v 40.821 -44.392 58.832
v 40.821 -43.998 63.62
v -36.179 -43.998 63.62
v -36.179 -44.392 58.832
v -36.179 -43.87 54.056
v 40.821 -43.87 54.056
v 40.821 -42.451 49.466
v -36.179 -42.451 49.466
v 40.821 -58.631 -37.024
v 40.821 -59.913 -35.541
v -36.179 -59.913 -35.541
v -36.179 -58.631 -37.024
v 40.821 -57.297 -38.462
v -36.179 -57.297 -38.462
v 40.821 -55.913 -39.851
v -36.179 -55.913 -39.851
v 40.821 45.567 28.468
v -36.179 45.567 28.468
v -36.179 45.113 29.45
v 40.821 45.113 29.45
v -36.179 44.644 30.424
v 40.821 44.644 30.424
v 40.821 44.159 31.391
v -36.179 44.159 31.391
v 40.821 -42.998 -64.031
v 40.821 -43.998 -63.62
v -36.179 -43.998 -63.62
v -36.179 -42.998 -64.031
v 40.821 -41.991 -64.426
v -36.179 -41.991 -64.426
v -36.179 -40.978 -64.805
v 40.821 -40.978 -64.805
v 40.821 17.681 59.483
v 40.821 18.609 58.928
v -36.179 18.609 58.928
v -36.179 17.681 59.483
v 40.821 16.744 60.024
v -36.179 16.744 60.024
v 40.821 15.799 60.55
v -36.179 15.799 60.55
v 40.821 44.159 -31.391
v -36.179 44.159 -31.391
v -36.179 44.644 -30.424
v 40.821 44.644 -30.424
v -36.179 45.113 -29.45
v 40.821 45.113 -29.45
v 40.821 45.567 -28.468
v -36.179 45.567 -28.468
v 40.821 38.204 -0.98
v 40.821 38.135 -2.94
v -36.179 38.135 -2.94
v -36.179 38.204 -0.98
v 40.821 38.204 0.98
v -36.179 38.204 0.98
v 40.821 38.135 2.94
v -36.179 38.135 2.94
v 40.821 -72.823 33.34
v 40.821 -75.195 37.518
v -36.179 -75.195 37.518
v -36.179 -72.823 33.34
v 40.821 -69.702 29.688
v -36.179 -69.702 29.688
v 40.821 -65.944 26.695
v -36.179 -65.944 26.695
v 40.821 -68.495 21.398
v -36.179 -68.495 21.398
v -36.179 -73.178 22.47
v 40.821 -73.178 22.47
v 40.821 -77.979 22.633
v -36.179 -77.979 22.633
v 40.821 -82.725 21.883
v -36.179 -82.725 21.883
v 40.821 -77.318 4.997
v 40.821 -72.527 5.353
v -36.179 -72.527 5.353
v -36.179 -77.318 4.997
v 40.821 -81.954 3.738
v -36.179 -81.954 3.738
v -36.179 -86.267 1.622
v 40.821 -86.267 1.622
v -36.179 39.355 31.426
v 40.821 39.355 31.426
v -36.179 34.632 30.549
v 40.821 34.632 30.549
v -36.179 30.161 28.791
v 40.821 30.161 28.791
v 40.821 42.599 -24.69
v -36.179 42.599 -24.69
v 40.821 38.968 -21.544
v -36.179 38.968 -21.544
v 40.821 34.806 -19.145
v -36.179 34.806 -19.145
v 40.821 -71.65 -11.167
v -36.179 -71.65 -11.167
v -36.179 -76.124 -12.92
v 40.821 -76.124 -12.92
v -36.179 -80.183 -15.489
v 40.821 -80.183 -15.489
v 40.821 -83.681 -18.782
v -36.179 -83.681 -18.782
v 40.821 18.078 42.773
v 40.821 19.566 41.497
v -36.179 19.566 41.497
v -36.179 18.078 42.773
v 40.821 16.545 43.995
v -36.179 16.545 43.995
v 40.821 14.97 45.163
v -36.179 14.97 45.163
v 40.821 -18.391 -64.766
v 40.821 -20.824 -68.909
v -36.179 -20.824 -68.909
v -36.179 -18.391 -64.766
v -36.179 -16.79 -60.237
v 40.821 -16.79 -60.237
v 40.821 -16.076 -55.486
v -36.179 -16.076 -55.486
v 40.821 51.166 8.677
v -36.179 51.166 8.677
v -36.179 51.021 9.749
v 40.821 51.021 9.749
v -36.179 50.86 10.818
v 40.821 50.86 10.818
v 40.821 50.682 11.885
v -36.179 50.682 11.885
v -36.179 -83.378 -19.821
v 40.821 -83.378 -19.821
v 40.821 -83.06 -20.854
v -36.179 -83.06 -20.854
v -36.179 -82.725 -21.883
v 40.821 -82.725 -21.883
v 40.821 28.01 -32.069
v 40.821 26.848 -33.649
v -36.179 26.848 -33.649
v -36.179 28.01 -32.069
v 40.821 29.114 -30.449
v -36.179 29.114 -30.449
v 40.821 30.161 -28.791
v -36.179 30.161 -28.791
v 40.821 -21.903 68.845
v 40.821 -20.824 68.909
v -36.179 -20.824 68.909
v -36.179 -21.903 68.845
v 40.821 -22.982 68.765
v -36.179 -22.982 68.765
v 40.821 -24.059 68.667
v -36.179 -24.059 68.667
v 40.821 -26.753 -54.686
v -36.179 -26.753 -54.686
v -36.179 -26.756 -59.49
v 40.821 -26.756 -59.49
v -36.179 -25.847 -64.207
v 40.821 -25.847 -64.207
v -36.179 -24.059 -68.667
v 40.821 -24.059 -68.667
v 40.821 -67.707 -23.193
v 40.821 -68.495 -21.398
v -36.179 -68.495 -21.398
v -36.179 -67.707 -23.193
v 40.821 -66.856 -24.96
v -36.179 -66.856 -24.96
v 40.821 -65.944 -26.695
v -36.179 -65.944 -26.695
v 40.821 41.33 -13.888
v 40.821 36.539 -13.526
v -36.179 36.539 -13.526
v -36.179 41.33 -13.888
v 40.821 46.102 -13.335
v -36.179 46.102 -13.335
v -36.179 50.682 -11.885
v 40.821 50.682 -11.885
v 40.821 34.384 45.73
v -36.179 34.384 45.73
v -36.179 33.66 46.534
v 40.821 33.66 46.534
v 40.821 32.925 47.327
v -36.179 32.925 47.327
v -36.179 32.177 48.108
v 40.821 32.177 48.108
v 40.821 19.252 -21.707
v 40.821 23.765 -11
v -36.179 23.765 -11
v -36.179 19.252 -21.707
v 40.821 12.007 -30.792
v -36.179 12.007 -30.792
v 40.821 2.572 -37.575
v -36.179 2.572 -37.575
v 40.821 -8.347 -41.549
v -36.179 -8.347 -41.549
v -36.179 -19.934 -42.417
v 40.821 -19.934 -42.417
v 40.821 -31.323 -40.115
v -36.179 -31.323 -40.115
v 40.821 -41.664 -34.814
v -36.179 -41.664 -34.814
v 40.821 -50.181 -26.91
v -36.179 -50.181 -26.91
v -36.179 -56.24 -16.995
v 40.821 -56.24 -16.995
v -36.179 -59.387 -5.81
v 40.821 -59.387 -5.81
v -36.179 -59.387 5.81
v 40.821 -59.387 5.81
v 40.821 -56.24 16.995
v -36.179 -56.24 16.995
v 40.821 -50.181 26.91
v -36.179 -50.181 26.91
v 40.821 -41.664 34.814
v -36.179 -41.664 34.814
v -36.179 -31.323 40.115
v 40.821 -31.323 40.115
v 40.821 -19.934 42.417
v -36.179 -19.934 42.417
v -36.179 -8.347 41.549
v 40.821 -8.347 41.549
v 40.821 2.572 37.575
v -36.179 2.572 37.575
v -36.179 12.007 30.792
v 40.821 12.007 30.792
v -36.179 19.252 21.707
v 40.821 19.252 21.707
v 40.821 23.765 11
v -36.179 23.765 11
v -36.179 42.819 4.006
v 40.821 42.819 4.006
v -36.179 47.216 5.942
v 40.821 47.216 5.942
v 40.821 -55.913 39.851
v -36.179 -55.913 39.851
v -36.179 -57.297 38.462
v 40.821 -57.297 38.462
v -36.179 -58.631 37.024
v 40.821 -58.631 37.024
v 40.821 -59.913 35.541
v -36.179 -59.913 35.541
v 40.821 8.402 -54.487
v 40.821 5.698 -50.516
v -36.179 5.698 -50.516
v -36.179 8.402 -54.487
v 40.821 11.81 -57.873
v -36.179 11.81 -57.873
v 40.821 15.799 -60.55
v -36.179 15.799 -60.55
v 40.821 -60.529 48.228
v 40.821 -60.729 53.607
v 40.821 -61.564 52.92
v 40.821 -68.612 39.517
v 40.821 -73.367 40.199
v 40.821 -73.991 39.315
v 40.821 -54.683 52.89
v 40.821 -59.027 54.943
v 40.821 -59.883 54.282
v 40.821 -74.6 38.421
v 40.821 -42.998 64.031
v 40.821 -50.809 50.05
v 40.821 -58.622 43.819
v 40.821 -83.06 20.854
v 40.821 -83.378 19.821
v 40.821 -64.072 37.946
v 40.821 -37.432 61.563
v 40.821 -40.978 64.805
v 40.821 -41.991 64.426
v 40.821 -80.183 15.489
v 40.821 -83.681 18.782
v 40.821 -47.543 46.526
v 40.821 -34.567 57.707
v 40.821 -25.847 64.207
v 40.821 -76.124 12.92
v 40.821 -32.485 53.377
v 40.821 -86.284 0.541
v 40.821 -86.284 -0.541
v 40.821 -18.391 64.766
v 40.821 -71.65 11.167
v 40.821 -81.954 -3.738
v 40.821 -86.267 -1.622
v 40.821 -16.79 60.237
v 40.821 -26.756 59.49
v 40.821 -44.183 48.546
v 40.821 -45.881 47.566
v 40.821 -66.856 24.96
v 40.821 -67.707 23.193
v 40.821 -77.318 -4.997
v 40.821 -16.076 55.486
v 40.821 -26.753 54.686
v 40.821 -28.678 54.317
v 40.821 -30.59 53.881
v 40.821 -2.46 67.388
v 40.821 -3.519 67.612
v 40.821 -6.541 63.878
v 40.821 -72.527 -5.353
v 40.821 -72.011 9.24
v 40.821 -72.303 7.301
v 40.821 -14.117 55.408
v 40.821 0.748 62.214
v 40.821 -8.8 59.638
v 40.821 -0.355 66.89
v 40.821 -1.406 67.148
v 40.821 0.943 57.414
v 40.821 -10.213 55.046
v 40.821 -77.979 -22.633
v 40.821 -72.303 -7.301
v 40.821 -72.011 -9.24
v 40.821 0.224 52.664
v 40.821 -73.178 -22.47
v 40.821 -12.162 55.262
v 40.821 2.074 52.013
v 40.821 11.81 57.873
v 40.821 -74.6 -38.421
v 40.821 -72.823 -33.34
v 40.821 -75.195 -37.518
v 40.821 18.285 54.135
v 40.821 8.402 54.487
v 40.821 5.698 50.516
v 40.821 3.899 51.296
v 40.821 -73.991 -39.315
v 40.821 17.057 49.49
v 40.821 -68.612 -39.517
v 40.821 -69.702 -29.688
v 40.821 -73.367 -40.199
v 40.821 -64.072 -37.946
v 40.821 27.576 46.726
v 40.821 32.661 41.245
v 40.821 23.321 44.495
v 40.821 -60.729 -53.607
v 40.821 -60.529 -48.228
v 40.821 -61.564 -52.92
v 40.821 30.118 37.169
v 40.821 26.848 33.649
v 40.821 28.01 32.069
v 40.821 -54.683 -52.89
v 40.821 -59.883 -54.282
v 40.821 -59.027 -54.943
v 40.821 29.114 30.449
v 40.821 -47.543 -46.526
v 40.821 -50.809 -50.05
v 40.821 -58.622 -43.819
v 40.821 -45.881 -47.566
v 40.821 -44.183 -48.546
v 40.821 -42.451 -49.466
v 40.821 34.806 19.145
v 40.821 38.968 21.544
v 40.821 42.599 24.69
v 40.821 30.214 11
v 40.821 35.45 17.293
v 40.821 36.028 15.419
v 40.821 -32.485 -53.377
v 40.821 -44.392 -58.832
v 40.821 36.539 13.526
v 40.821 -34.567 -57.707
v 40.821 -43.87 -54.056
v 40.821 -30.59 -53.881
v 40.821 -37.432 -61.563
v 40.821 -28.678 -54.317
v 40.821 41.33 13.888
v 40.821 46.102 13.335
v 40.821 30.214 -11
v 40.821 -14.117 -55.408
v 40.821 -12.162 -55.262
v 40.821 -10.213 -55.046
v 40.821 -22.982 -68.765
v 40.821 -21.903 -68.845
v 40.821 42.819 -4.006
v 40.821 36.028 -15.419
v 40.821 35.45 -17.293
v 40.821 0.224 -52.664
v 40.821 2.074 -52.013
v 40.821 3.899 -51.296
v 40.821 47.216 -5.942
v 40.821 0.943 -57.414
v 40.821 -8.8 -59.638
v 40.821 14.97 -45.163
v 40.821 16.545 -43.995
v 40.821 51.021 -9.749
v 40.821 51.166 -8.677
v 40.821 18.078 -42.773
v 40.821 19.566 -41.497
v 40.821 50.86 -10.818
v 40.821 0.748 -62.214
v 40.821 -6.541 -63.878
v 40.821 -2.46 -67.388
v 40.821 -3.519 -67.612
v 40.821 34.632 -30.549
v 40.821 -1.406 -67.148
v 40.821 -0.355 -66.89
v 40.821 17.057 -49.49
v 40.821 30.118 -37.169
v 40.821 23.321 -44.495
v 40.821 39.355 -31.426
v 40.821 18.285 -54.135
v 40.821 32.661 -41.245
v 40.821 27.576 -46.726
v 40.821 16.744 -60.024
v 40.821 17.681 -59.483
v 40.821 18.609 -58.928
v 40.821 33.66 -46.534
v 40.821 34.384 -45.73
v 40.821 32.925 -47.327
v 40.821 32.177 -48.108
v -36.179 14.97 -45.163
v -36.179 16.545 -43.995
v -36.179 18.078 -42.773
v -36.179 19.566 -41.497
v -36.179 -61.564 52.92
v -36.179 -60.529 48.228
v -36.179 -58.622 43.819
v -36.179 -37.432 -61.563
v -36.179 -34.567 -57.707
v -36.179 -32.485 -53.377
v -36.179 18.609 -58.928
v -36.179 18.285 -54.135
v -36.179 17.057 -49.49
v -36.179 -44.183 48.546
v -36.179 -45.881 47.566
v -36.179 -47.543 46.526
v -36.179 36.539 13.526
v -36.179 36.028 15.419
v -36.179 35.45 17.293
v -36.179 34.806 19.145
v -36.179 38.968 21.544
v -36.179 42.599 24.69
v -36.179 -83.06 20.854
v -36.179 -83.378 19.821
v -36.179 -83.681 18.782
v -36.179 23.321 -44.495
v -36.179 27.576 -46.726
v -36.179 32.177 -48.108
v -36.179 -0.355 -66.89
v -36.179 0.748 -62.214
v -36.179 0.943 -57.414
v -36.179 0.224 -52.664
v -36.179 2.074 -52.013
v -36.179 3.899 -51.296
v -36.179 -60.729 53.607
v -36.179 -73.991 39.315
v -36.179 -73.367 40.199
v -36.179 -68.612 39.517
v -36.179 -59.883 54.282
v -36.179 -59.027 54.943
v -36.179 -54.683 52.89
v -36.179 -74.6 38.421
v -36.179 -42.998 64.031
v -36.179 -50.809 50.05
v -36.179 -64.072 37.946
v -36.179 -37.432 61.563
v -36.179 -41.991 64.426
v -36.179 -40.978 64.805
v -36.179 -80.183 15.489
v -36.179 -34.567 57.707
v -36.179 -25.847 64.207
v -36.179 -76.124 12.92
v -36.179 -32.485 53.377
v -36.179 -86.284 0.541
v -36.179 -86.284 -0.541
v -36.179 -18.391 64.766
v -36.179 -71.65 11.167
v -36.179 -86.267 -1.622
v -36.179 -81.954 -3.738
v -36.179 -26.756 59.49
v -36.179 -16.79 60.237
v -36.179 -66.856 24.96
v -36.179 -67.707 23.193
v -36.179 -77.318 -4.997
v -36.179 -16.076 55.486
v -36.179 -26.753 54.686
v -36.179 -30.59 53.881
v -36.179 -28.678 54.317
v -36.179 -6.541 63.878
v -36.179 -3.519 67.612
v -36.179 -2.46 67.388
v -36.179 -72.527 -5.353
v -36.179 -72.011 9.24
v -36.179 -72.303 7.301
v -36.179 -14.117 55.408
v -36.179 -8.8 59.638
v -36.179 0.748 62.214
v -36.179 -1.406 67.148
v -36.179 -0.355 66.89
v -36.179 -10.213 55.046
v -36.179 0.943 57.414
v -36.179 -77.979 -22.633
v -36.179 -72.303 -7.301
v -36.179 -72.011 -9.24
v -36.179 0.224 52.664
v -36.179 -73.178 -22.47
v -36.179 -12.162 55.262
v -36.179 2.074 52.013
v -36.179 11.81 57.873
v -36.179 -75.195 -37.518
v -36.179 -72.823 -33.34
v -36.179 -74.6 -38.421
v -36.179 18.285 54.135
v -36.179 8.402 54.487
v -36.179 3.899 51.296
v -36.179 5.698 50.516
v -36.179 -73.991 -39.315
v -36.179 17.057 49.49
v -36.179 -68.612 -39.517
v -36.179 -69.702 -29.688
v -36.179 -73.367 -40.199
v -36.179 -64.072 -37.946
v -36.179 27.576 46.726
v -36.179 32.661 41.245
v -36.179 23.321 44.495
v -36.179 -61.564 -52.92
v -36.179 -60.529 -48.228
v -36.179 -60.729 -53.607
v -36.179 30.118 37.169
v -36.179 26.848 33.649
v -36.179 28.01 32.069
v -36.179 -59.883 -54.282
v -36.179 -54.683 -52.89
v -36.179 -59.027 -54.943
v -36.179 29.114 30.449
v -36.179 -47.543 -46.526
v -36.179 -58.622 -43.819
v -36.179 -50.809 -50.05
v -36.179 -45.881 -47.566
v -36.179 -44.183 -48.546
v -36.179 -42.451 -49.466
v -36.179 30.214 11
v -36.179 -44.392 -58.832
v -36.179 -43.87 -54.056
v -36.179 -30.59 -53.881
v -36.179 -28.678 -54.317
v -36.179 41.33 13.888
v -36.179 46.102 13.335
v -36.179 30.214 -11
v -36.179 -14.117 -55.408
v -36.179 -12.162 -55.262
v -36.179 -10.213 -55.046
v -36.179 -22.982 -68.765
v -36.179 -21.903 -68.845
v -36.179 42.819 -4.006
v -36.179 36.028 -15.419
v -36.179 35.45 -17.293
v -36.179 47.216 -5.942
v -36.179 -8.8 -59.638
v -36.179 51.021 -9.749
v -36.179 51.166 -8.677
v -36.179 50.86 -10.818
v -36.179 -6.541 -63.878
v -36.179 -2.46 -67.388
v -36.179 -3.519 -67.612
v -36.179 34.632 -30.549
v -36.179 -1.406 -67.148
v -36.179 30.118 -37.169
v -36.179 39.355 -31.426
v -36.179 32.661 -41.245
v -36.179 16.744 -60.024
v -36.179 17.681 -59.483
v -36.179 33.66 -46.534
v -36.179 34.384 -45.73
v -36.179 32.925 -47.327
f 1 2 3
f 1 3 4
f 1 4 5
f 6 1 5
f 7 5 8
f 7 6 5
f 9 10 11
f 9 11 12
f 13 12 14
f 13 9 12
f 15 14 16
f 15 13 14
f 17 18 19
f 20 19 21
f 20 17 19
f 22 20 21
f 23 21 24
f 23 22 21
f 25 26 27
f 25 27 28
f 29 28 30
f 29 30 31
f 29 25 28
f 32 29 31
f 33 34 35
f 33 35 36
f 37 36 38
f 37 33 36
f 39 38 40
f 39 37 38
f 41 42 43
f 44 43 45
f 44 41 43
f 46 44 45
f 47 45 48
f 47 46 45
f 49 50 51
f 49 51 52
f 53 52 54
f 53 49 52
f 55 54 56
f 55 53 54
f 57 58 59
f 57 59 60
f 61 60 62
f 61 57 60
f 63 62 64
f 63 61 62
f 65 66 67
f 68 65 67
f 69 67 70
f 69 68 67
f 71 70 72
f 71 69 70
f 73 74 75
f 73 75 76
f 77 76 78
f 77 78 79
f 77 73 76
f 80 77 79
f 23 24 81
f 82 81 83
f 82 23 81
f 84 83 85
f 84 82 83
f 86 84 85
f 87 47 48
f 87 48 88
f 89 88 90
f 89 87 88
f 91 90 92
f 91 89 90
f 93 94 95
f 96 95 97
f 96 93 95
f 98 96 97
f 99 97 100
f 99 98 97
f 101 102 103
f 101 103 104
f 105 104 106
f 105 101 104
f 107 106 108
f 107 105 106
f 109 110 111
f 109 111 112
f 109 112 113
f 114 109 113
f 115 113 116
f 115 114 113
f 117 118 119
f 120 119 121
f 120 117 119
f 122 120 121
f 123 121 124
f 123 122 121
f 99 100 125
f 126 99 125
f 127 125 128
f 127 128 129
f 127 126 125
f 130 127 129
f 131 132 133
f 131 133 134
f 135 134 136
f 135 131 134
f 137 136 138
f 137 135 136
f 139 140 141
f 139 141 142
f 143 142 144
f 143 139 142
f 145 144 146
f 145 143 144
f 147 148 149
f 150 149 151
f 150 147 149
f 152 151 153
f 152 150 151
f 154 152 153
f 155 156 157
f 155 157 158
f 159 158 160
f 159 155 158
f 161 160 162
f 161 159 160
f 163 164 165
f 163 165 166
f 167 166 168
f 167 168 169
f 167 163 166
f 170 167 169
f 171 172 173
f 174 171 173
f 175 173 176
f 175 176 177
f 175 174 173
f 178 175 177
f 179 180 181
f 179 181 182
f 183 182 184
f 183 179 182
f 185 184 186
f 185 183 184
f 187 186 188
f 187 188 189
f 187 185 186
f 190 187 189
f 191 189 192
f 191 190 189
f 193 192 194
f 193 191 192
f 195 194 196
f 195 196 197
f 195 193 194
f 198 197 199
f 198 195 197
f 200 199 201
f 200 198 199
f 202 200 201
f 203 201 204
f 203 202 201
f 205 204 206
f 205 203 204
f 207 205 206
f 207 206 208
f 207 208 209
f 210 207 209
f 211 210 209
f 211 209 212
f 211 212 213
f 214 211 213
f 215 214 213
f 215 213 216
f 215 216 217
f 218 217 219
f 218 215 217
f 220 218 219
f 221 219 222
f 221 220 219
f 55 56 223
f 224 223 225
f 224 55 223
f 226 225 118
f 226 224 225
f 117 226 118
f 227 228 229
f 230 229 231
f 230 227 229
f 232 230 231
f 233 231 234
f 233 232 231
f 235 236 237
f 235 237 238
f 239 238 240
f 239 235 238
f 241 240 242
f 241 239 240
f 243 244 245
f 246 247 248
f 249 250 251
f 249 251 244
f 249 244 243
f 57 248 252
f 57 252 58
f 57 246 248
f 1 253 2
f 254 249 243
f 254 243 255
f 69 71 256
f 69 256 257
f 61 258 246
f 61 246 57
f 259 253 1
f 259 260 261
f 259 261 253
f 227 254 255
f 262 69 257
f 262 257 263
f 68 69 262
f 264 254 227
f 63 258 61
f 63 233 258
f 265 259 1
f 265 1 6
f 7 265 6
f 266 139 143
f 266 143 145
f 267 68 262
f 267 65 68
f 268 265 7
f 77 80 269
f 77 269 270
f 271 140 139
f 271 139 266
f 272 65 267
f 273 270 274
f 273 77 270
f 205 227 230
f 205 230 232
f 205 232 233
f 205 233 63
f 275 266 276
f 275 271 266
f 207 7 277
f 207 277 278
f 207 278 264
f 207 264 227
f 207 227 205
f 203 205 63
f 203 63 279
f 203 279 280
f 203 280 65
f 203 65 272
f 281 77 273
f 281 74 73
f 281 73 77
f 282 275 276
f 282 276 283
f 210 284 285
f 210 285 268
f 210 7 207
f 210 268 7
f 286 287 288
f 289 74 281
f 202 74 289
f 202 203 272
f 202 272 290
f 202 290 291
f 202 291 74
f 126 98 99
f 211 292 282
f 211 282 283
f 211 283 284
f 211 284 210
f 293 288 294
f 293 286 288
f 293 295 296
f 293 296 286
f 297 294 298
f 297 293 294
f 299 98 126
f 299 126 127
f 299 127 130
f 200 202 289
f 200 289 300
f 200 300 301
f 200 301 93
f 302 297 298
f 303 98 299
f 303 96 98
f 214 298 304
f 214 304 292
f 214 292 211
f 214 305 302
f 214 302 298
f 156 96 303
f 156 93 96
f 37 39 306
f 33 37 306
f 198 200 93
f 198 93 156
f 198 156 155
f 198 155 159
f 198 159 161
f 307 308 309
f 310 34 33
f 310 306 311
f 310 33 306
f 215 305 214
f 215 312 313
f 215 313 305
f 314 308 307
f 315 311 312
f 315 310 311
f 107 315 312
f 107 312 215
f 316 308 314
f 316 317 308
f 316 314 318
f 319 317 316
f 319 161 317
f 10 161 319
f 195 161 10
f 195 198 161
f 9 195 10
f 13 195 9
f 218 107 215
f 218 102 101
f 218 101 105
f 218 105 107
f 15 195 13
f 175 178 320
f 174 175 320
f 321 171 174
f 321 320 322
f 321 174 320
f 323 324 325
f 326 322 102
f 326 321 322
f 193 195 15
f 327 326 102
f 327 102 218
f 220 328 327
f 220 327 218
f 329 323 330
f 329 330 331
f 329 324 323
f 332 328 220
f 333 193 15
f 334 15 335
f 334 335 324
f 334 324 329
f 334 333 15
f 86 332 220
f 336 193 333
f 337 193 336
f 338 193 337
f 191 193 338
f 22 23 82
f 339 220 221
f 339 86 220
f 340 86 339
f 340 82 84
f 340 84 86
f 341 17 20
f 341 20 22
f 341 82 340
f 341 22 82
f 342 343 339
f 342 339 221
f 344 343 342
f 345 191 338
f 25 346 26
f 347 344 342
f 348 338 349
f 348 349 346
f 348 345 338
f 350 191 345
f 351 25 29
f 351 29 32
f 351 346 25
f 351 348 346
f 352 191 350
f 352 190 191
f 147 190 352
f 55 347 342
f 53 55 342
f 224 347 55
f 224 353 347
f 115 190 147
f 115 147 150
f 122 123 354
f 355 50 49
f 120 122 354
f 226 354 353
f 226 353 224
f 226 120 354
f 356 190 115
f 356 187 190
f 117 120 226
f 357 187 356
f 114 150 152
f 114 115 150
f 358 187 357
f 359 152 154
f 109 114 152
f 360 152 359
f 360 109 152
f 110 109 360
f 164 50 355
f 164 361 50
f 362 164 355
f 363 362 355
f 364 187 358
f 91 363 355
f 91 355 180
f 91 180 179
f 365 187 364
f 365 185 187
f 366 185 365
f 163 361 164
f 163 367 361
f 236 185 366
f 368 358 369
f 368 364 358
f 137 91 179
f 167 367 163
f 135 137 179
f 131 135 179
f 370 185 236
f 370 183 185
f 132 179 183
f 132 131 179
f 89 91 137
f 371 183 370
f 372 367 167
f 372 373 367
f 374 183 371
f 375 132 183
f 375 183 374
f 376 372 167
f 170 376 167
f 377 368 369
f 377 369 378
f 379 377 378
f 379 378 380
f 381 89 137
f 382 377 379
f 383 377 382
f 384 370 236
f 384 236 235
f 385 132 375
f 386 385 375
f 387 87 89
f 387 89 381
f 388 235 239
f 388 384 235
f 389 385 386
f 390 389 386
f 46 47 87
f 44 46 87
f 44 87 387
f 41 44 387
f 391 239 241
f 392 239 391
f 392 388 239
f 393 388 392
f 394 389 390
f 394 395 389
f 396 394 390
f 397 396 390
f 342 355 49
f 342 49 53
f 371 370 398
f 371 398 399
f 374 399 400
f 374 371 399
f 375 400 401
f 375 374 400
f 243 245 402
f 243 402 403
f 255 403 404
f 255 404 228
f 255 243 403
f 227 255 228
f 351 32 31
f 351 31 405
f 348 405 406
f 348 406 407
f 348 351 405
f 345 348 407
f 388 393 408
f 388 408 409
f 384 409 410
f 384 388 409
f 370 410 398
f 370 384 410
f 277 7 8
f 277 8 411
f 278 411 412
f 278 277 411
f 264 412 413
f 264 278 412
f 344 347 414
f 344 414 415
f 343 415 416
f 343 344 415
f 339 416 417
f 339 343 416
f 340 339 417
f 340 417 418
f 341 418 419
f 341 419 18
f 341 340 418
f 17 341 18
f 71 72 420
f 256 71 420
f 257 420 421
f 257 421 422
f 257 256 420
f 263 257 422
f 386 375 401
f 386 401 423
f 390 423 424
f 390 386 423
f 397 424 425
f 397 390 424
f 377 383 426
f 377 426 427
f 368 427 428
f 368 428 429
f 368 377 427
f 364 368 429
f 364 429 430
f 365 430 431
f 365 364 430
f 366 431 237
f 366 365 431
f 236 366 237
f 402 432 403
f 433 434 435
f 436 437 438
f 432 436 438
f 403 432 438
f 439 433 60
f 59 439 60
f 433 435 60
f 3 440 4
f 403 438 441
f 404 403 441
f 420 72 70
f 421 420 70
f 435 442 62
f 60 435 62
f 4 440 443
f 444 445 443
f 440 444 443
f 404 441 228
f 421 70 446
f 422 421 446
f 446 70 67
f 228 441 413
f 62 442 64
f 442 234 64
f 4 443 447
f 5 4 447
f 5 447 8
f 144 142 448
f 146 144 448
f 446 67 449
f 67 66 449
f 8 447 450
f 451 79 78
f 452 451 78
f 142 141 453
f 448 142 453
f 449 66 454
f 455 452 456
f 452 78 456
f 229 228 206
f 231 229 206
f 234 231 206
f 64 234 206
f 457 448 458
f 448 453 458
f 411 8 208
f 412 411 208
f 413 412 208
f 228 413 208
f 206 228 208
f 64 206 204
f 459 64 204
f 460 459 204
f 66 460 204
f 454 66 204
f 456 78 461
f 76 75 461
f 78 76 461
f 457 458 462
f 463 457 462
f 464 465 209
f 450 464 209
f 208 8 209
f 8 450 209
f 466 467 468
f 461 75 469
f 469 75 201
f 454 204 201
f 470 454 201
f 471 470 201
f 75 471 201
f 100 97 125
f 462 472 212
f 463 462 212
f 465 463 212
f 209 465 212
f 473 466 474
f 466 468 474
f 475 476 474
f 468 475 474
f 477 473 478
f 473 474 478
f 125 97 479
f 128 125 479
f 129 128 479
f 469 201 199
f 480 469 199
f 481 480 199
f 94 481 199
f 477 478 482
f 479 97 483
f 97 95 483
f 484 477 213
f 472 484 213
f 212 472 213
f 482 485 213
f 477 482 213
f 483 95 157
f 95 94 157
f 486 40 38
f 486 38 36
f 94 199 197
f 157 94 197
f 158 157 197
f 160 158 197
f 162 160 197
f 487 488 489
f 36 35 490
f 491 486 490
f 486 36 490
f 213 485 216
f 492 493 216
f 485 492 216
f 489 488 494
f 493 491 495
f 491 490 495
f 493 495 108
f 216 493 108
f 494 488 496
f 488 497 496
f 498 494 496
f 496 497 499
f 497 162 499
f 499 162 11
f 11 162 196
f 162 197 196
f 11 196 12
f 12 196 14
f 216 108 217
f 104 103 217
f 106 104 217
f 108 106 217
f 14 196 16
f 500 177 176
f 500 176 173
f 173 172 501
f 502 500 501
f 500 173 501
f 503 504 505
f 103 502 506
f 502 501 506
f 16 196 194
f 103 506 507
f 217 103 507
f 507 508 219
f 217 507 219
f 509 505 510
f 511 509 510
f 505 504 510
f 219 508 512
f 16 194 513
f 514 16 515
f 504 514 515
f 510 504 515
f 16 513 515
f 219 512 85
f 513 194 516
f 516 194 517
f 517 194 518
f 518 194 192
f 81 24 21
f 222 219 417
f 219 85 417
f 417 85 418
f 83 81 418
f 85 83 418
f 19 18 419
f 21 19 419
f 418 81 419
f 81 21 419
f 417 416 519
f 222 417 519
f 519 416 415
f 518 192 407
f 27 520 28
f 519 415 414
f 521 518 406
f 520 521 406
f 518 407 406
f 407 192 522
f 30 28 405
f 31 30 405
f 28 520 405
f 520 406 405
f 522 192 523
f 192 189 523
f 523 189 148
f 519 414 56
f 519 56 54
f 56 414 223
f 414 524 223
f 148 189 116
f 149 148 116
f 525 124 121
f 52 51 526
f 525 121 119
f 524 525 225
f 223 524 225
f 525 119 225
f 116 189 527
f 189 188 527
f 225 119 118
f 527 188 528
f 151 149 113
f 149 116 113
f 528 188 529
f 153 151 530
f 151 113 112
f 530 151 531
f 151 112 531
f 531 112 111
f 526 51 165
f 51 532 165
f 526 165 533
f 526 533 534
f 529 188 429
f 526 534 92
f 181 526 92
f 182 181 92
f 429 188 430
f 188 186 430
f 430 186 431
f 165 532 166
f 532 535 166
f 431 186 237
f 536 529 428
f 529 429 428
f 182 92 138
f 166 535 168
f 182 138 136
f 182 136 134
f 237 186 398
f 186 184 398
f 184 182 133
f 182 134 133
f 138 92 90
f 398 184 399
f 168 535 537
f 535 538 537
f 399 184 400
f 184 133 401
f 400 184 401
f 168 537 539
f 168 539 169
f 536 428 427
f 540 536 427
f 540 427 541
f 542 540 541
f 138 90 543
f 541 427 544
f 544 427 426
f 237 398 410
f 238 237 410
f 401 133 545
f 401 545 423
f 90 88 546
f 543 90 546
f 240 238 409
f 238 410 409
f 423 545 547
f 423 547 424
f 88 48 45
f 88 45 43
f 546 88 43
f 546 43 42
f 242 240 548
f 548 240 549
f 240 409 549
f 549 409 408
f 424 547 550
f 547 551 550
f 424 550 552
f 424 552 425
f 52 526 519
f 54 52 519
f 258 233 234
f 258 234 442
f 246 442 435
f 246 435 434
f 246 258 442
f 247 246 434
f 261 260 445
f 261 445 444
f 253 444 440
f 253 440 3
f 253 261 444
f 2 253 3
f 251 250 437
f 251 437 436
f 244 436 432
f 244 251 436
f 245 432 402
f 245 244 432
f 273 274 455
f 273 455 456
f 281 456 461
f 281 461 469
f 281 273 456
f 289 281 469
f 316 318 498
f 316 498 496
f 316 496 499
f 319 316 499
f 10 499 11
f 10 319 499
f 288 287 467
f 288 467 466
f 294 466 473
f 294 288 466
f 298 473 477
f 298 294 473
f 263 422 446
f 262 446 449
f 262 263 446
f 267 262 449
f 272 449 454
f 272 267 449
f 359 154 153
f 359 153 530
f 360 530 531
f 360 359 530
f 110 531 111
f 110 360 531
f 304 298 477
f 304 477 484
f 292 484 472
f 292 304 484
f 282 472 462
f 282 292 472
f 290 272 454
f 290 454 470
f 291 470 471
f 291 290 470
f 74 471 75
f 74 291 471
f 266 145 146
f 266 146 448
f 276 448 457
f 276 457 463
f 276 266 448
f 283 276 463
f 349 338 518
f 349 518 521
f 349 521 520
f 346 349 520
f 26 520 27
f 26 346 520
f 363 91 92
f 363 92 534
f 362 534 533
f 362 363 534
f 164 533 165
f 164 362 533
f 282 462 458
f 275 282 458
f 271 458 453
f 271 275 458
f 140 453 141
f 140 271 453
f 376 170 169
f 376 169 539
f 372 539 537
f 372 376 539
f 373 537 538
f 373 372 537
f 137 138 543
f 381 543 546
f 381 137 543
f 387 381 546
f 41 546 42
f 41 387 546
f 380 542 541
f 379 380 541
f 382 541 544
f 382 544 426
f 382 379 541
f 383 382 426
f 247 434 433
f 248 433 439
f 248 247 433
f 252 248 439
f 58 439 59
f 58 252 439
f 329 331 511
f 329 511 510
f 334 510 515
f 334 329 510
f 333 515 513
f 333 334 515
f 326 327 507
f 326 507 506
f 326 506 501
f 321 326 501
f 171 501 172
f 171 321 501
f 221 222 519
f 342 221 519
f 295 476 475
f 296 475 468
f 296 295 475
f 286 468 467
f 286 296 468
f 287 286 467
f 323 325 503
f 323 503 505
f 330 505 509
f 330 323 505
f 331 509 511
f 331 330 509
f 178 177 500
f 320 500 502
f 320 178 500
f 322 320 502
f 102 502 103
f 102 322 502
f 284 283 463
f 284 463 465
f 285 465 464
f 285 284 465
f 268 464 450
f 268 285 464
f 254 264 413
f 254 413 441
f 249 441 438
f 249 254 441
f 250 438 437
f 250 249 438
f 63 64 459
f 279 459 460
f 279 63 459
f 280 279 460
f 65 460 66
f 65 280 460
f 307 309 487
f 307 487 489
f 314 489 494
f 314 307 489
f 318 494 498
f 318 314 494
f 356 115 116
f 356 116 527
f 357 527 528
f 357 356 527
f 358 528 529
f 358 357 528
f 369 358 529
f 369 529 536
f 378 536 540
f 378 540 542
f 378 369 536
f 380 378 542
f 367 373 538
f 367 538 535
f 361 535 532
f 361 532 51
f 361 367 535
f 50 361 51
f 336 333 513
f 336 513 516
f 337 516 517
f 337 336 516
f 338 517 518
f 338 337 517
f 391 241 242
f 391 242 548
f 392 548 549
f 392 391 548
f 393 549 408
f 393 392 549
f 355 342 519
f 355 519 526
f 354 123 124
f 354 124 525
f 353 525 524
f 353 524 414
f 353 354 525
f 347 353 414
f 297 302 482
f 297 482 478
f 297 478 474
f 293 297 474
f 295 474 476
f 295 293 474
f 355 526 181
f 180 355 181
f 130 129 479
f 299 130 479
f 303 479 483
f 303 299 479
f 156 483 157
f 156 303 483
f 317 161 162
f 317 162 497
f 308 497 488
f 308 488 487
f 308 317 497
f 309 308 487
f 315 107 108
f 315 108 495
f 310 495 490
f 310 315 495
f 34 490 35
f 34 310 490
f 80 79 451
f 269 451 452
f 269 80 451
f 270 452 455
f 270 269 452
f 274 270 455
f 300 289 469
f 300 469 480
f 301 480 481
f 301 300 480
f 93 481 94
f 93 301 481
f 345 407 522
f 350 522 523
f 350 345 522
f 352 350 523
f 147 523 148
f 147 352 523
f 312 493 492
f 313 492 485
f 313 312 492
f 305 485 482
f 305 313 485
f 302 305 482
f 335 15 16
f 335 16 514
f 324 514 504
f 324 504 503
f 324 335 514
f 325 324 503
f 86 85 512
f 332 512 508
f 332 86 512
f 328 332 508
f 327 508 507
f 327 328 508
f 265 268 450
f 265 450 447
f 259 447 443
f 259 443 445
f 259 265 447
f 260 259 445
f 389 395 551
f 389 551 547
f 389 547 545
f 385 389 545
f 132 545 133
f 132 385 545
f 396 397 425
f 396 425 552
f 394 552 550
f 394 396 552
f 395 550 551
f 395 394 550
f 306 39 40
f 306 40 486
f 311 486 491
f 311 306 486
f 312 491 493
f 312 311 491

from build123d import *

# Parameters (mm, degrees)
BOSS_EXTRU_1_DEPTH = 77


with BuildPart() as part:
    # Esquisse1 → Boss.-Extru.1 (new body)
    with BuildSketch(Plane(origin=(40.821362871, 0, 0), x_dir=(0, 0, -1), z_dir=(1, 0, 0))):
        with BuildLine():
            ThreePointArc((-67.612453277, -3.518534748), (-61.812081339, -7.771811815), (-55.046417386, -10.213219545))
            ThreePointArc((-55.046417386, -10.213219545), (-55.34381354, -13.139028919), (-55.485808315, -16.076484017))
            ThreePointArc((-55.485808315, -16.076484017), (-62.539778332, -17.482253352), (-68.909282961, -20.82352425))
            ThreePointArc((-68.909282961, -20.82352425), (-68.807062006, -22.442850841), (-68.666793133, -24.059326134))
            ThreePointArc((-68.666793133, -24.059326134), (-61.870440021, -26.413952393), (-54.685737973, -26.752680769))
            ThreePointArc((-54.685737973, -26.752680769), (-54.107524198, -29.636163697), (-53.377380454, -32.484969601))
            ThreePointArc((-53.377380454, -32.484969601), (-59.70360459, -35.907478712), (-64.805273114, -40.977750767))
            ThreePointArc((-64.805273114, -40.977750767), (-64.230288656, -42.495005065), (-63.619787079, -43.99831992))
            ThreePointArc((-63.619787079, -43.99831992), (-56.431338594, -44.245076494), (-49.465990757, -42.451028013))
            ThreePointArc((-49.465990757, -42.451028013), (-48.063543885, -45.035974383), (-46.526138097, -47.543002188))
            ThreePointArc((-46.526138097, -47.543002188), (-51.562503575, -52.67814612), (-54.943030357, -59.026903409))
            ThreePointArc((-54.943030357, -59.026903409), (-53.94637229, -60.307270712), (-52.919883753, -61.563849007))
            ThreePointArc((-52.919883753, -61.563849007), (-45.978065087, -59.680810492), (-39.850973185, -55.913394235))
            ThreePointArc((-39.850973185, -55.913394235), (-37.748906774, -57.970120218), (-35.540844194, -59.9126095))
            ThreePointArc((-35.540844194, -59.9126095), (-38.839847839, -66.30410818), (-40.198858239, -73.367235757))
            ThreePointArc((-40.198858239, -73.367235757), (-38.869084006, -74.296949811), (-37.51781652, -75.195139051))
            ThreePointArc((-37.51781652, -75.195139051), (-31.439438727, -71.349621682), (-26.695021762, -65.943589116))
            ThreePointArc((-26.695021762, -65.943589116), (-24.080113637, -67.289345583), (-21.397590315, -68.494697646))
            ThreePointArc((-21.397590315, -68.494697646), (-22.666101177, -75.574638368), (-21.882841157, -82.724546352))
            ThreePointArc((-21.882841157, -82.724546352), (-20.338107034, -83.220997983), (-18.782126645, -83.680990111))
            ThreePointArc((-18.782126645, -83.680990111), (-14.107280265, -78.214684982), (-11.167100506, -71.650385825))
            ThreePointArc((-11.167100506, -71.650385825), (-8.271696731, -72.165596408), (-5.353066636, -72.526710431))
            ThreePointArc((-5.353066636, -72.526710431), (-4.478371957, -79.666009392), (-1.622437607, -86.267397081))
            ThreePointArc((-1.622437607, -86.267397081), (0, -86.286474383), (1.622437607, -86.267397081))
            ThreePointArc((1.622437607, -86.267397081), (4.478371957, -79.666009392), (5.353066636, -72.526710431))
            ThreePointArc((5.353066636, -72.526710431), (8.271696731, -72.165596408), (11.167100506, -71.650385825))
            ThreePointArc((11.167100506, -71.650385825), (14.107280265, -78.214684982), (18.782126645, -83.680990111))
            ThreePointArc((18.782126645, -83.680990111), (20.338107034, -83.220997983), (21.882841157, -82.724546352))
            ThreePointArc((21.882841157, -82.724546352), (22.666101177, -75.574638368), (21.397590315, -68.494697646))
            ThreePointArc((21.397590315, -68.494697646), (24.080113637, -67.289345583), (26.695021762, -65.943589116))
            ThreePointArc((26.695021762, -65.943589116), (31.439438727, -71.349621682), (37.51781652, -75.195139051))
            ThreePointArc((37.51781652, -75.195139051), (38.869084006, -74.296949811), (40.198858239, -73.367235757))
            ThreePointArc((40.198858239, -73.367235757), (38.839847839, -66.30410818), (35.540844194, -59.9126095))
            ThreePointArc((35.540844194, -59.9126095), (37.748906774, -57.970120218), (39.850973185, -55.913394235))
            ThreePointArc((39.850973185, -55.913394235), (45.978065087, -59.680810492), (52.919883753, -61.563849007))
            ThreePointArc((52.919883753, -61.563849007), (53.94637229, -60.307270712), (54.943030357, -59.026903409))
            ThreePointArc((54.943030357, -59.026903409), (51.562503575, -52.67814612), (46.526138097, -47.543002188))
            ThreePointArc((46.526138097, -47.543002188), (48.063543885, -45.035974383), (49.465990757, -42.451028013))
            ThreePointArc((49.465990757, -42.451028013), (56.431338594, -44.245076494), (63.619787079, -43.99831992))
            ThreePointArc((63.619787079, -43.99831992), (64.230288656, -42.495005065), (64.805273114, -40.977750767))
            ThreePointArc((64.805273114, -40.977750767), (59.70360459, -35.907478712), (53.377380454, -32.484969601))
            ThreePointArc((53.377380454, -32.484969601), (54.107524198, -29.636163697), (54.685737973, -26.752680769))
            ThreePointArc((54.685737973, -26.752680769), (61.870440021, -26.413952393), (68.666793133, -24.059326134))
            ThreePointArc((68.666793133, -24.059326134), (68.807062006, -22.442850841), (68.909282961, -20.82352425))
            ThreePointArc((68.909282961, -20.82352425), (62.539778332, -17.482253352), (55.485808315, -16.076484017))
            ThreePointArc((55.485808315, -16.076484017), (55.34381354, -13.139028919), (55.046417386, -10.213219545))
            ThreePointArc((55.046417386, -10.213219545), (61.812081339, -7.771811815), (67.612453277, -3.518534748))
            ThreePointArc((67.612453277, -3.518534748), (67.270025941, -1.93252994), (66.890400614, -0.355015331))
            ThreePointArc((66.890400614, -0.355015331), (59.819018318, 0.960367828), (52.664078611, 0.224488613))
            ThreePointArc((52.664078611, 0.224488613), (51.662562176, 2.989587128), (50.515981046, 5.697751946))
            ThreePointArc((50.515981046, 5.697751946), (56.261447972, 10.024909239), (60.550450236, 15.798914782))
            ThreePointArc((60.550450236, 15.798914782), (59.755752861, 17.213525617), (58.928012629, 18.609059149))
            ThreePointArc((58.928012629, 18.609059149), (51.783076015, 17.781677003), (45.16291441, 14.969535335))
            ThreePointArc((45.16291441, 14.969535335), (43.390865445, 17.31658613), (41.496978105, 19.566474063))
            ThreePointArc((41.496978105, 19.566474063), (45.711738053, 25.394894004), (48.10827397, 32.176582292))
            ThreePointArc((48.10827397, 32.176582292), (46.931918906, 33.294104773), (45.729612121, 34.383657949))
            ThreePointArc((45.729612121, 34.383657949), (39.145980162, 31.487027033), (33.64882707, 26.848494041))
            ThreePointArc((33.64882707, 26.848494041), (31.263699902, 28.568951352), (28.790786553, 30.160649984))
            ThreePointArc((28.790786553, 30.160649984), (31.100339606, 36.972451884), (31.391466441, 44.159240151))
            ThreePointArc((31.391466441, 44.159240151), (29.937977999, 44.880377502), (28.467934894, 45.567138742))
            ThreePointArc((28.467934894, 45.567138742), (23.030592182, 40.858637423), (19.14489378, 34.805867119))
            ThreePointArc((19.14489378, 34.805867119), (16.358617425, 35.746860765), (13.526407269, 36.538940686))
            ThreePointArc((13.526407269, 36.538940686), (13.725539503, 43.728866053), (11.885389361, 50.682176624))
            ThreePointArc((11.885389361, 50.682176624), (10.283916366, 50.942852626), (8.676756723, 51.165800179))
            ThreePointArc((8.676756723, 51.165800179), (4.868835019, 45.063799464), (2.93985266, 38.134607051))
            ThreePointArc((2.93985266, 38.134607051), (0, 38.212525617), (-2.93985266, 38.134607051))
            ThreePointArc((-2.93985266, 38.134607051), (-4.868835019, 45.063799464), (-8.676756723, 51.165800179))
            ThreePointArc((-8.676756723, 51.165800179), (-10.283916366, 50.942852626), (-11.885389361, 50.682176624))
            ThreePointArc((-11.885389361, 50.682176624), (-13.725539503, 43.728866053), (-13.526407269, 36.538940686))
            ThreePointArc((-13.526407269, 36.538940686), (-16.358617425, 35.746860765), (-19.14489378, 34.805867119))
            ThreePointArc((-19.14489378, 34.805867119), (-23.030592182, 40.858637423), (-28.467934894, 45.567138742))
            ThreePointArc((-28.467934894, 45.567138742), (-29.937977999, 44.880377502), (-31.391466441, 44.159240151))
            ThreePointArc((-31.391466441, 44.159240151), (-31.100339606, 36.972451884), (-28.790786553, 30.160649984))
            ThreePointArc((-28.790786553, 30.160649984), (-31.263699902, 28.568951352), (-33.64882707, 26.848494041))
            ThreePointArc((-33.64882707, 26.848494041), (-39.145980162, 31.487027033), (-45.729612121, 34.383657949))
            ThreePointArc((-45.729612121, 34.383657949), (-46.931918906, 33.294104773), (-48.10827397, 32.176582292))
            ThreePointArc((-48.10827397, 32.176582292), (-45.711738053, 25.394894004), (-41.496978105, 19.566474063))
            ThreePointArc((-41.496978105, 19.566474063), (-43.390865445, 17.31658613), (-45.16291441, 14.969535335))
            ThreePointArc((-45.16291441, 14.969535335), (-51.783076015, 17.781677003), (-58.928012629, 18.609059149))
            ThreePointArc((-58.928012629, 18.609059149), (-59.755752861, 17.213525617), (-60.550450236, 15.798914782))
            ThreePointArc((-60.550450236, 15.798914782), (-56.261447972, 10.024909239), (-50.515981046, 5.697751946))
            ThreePointArc((-50.515981046, 5.697751946), (-51.662562176, 2.989587128), (-52.664078611, 0.224488613))
            ThreePointArc((-52.664078611, 0.224488613), (-59.819018318, 0.960367828), (-66.890400614, -0.355015331))
            ThreePointArc((-66.890400614, -0.355015331), (-67.270025941, -1.93252994), (-67.612453277, -3.518534748))
        make_face()
        with BuildLine():
            Line((-11, 30.213525617), (11, 30.213525617))
            Line((11, 30.213525617), (11, 23.765322167))
            ThreePointArc((11, 23.765322167), (0, -59.786474383), (-11, 23.765322167))
            Line((-11, 23.765322167), (-11, 30.213525617))
        make_face(mode=Mode.SUBTRACT)
    extrude(amount=-BOSS_EXTRU_1_DEPTH)


solid = part.part
